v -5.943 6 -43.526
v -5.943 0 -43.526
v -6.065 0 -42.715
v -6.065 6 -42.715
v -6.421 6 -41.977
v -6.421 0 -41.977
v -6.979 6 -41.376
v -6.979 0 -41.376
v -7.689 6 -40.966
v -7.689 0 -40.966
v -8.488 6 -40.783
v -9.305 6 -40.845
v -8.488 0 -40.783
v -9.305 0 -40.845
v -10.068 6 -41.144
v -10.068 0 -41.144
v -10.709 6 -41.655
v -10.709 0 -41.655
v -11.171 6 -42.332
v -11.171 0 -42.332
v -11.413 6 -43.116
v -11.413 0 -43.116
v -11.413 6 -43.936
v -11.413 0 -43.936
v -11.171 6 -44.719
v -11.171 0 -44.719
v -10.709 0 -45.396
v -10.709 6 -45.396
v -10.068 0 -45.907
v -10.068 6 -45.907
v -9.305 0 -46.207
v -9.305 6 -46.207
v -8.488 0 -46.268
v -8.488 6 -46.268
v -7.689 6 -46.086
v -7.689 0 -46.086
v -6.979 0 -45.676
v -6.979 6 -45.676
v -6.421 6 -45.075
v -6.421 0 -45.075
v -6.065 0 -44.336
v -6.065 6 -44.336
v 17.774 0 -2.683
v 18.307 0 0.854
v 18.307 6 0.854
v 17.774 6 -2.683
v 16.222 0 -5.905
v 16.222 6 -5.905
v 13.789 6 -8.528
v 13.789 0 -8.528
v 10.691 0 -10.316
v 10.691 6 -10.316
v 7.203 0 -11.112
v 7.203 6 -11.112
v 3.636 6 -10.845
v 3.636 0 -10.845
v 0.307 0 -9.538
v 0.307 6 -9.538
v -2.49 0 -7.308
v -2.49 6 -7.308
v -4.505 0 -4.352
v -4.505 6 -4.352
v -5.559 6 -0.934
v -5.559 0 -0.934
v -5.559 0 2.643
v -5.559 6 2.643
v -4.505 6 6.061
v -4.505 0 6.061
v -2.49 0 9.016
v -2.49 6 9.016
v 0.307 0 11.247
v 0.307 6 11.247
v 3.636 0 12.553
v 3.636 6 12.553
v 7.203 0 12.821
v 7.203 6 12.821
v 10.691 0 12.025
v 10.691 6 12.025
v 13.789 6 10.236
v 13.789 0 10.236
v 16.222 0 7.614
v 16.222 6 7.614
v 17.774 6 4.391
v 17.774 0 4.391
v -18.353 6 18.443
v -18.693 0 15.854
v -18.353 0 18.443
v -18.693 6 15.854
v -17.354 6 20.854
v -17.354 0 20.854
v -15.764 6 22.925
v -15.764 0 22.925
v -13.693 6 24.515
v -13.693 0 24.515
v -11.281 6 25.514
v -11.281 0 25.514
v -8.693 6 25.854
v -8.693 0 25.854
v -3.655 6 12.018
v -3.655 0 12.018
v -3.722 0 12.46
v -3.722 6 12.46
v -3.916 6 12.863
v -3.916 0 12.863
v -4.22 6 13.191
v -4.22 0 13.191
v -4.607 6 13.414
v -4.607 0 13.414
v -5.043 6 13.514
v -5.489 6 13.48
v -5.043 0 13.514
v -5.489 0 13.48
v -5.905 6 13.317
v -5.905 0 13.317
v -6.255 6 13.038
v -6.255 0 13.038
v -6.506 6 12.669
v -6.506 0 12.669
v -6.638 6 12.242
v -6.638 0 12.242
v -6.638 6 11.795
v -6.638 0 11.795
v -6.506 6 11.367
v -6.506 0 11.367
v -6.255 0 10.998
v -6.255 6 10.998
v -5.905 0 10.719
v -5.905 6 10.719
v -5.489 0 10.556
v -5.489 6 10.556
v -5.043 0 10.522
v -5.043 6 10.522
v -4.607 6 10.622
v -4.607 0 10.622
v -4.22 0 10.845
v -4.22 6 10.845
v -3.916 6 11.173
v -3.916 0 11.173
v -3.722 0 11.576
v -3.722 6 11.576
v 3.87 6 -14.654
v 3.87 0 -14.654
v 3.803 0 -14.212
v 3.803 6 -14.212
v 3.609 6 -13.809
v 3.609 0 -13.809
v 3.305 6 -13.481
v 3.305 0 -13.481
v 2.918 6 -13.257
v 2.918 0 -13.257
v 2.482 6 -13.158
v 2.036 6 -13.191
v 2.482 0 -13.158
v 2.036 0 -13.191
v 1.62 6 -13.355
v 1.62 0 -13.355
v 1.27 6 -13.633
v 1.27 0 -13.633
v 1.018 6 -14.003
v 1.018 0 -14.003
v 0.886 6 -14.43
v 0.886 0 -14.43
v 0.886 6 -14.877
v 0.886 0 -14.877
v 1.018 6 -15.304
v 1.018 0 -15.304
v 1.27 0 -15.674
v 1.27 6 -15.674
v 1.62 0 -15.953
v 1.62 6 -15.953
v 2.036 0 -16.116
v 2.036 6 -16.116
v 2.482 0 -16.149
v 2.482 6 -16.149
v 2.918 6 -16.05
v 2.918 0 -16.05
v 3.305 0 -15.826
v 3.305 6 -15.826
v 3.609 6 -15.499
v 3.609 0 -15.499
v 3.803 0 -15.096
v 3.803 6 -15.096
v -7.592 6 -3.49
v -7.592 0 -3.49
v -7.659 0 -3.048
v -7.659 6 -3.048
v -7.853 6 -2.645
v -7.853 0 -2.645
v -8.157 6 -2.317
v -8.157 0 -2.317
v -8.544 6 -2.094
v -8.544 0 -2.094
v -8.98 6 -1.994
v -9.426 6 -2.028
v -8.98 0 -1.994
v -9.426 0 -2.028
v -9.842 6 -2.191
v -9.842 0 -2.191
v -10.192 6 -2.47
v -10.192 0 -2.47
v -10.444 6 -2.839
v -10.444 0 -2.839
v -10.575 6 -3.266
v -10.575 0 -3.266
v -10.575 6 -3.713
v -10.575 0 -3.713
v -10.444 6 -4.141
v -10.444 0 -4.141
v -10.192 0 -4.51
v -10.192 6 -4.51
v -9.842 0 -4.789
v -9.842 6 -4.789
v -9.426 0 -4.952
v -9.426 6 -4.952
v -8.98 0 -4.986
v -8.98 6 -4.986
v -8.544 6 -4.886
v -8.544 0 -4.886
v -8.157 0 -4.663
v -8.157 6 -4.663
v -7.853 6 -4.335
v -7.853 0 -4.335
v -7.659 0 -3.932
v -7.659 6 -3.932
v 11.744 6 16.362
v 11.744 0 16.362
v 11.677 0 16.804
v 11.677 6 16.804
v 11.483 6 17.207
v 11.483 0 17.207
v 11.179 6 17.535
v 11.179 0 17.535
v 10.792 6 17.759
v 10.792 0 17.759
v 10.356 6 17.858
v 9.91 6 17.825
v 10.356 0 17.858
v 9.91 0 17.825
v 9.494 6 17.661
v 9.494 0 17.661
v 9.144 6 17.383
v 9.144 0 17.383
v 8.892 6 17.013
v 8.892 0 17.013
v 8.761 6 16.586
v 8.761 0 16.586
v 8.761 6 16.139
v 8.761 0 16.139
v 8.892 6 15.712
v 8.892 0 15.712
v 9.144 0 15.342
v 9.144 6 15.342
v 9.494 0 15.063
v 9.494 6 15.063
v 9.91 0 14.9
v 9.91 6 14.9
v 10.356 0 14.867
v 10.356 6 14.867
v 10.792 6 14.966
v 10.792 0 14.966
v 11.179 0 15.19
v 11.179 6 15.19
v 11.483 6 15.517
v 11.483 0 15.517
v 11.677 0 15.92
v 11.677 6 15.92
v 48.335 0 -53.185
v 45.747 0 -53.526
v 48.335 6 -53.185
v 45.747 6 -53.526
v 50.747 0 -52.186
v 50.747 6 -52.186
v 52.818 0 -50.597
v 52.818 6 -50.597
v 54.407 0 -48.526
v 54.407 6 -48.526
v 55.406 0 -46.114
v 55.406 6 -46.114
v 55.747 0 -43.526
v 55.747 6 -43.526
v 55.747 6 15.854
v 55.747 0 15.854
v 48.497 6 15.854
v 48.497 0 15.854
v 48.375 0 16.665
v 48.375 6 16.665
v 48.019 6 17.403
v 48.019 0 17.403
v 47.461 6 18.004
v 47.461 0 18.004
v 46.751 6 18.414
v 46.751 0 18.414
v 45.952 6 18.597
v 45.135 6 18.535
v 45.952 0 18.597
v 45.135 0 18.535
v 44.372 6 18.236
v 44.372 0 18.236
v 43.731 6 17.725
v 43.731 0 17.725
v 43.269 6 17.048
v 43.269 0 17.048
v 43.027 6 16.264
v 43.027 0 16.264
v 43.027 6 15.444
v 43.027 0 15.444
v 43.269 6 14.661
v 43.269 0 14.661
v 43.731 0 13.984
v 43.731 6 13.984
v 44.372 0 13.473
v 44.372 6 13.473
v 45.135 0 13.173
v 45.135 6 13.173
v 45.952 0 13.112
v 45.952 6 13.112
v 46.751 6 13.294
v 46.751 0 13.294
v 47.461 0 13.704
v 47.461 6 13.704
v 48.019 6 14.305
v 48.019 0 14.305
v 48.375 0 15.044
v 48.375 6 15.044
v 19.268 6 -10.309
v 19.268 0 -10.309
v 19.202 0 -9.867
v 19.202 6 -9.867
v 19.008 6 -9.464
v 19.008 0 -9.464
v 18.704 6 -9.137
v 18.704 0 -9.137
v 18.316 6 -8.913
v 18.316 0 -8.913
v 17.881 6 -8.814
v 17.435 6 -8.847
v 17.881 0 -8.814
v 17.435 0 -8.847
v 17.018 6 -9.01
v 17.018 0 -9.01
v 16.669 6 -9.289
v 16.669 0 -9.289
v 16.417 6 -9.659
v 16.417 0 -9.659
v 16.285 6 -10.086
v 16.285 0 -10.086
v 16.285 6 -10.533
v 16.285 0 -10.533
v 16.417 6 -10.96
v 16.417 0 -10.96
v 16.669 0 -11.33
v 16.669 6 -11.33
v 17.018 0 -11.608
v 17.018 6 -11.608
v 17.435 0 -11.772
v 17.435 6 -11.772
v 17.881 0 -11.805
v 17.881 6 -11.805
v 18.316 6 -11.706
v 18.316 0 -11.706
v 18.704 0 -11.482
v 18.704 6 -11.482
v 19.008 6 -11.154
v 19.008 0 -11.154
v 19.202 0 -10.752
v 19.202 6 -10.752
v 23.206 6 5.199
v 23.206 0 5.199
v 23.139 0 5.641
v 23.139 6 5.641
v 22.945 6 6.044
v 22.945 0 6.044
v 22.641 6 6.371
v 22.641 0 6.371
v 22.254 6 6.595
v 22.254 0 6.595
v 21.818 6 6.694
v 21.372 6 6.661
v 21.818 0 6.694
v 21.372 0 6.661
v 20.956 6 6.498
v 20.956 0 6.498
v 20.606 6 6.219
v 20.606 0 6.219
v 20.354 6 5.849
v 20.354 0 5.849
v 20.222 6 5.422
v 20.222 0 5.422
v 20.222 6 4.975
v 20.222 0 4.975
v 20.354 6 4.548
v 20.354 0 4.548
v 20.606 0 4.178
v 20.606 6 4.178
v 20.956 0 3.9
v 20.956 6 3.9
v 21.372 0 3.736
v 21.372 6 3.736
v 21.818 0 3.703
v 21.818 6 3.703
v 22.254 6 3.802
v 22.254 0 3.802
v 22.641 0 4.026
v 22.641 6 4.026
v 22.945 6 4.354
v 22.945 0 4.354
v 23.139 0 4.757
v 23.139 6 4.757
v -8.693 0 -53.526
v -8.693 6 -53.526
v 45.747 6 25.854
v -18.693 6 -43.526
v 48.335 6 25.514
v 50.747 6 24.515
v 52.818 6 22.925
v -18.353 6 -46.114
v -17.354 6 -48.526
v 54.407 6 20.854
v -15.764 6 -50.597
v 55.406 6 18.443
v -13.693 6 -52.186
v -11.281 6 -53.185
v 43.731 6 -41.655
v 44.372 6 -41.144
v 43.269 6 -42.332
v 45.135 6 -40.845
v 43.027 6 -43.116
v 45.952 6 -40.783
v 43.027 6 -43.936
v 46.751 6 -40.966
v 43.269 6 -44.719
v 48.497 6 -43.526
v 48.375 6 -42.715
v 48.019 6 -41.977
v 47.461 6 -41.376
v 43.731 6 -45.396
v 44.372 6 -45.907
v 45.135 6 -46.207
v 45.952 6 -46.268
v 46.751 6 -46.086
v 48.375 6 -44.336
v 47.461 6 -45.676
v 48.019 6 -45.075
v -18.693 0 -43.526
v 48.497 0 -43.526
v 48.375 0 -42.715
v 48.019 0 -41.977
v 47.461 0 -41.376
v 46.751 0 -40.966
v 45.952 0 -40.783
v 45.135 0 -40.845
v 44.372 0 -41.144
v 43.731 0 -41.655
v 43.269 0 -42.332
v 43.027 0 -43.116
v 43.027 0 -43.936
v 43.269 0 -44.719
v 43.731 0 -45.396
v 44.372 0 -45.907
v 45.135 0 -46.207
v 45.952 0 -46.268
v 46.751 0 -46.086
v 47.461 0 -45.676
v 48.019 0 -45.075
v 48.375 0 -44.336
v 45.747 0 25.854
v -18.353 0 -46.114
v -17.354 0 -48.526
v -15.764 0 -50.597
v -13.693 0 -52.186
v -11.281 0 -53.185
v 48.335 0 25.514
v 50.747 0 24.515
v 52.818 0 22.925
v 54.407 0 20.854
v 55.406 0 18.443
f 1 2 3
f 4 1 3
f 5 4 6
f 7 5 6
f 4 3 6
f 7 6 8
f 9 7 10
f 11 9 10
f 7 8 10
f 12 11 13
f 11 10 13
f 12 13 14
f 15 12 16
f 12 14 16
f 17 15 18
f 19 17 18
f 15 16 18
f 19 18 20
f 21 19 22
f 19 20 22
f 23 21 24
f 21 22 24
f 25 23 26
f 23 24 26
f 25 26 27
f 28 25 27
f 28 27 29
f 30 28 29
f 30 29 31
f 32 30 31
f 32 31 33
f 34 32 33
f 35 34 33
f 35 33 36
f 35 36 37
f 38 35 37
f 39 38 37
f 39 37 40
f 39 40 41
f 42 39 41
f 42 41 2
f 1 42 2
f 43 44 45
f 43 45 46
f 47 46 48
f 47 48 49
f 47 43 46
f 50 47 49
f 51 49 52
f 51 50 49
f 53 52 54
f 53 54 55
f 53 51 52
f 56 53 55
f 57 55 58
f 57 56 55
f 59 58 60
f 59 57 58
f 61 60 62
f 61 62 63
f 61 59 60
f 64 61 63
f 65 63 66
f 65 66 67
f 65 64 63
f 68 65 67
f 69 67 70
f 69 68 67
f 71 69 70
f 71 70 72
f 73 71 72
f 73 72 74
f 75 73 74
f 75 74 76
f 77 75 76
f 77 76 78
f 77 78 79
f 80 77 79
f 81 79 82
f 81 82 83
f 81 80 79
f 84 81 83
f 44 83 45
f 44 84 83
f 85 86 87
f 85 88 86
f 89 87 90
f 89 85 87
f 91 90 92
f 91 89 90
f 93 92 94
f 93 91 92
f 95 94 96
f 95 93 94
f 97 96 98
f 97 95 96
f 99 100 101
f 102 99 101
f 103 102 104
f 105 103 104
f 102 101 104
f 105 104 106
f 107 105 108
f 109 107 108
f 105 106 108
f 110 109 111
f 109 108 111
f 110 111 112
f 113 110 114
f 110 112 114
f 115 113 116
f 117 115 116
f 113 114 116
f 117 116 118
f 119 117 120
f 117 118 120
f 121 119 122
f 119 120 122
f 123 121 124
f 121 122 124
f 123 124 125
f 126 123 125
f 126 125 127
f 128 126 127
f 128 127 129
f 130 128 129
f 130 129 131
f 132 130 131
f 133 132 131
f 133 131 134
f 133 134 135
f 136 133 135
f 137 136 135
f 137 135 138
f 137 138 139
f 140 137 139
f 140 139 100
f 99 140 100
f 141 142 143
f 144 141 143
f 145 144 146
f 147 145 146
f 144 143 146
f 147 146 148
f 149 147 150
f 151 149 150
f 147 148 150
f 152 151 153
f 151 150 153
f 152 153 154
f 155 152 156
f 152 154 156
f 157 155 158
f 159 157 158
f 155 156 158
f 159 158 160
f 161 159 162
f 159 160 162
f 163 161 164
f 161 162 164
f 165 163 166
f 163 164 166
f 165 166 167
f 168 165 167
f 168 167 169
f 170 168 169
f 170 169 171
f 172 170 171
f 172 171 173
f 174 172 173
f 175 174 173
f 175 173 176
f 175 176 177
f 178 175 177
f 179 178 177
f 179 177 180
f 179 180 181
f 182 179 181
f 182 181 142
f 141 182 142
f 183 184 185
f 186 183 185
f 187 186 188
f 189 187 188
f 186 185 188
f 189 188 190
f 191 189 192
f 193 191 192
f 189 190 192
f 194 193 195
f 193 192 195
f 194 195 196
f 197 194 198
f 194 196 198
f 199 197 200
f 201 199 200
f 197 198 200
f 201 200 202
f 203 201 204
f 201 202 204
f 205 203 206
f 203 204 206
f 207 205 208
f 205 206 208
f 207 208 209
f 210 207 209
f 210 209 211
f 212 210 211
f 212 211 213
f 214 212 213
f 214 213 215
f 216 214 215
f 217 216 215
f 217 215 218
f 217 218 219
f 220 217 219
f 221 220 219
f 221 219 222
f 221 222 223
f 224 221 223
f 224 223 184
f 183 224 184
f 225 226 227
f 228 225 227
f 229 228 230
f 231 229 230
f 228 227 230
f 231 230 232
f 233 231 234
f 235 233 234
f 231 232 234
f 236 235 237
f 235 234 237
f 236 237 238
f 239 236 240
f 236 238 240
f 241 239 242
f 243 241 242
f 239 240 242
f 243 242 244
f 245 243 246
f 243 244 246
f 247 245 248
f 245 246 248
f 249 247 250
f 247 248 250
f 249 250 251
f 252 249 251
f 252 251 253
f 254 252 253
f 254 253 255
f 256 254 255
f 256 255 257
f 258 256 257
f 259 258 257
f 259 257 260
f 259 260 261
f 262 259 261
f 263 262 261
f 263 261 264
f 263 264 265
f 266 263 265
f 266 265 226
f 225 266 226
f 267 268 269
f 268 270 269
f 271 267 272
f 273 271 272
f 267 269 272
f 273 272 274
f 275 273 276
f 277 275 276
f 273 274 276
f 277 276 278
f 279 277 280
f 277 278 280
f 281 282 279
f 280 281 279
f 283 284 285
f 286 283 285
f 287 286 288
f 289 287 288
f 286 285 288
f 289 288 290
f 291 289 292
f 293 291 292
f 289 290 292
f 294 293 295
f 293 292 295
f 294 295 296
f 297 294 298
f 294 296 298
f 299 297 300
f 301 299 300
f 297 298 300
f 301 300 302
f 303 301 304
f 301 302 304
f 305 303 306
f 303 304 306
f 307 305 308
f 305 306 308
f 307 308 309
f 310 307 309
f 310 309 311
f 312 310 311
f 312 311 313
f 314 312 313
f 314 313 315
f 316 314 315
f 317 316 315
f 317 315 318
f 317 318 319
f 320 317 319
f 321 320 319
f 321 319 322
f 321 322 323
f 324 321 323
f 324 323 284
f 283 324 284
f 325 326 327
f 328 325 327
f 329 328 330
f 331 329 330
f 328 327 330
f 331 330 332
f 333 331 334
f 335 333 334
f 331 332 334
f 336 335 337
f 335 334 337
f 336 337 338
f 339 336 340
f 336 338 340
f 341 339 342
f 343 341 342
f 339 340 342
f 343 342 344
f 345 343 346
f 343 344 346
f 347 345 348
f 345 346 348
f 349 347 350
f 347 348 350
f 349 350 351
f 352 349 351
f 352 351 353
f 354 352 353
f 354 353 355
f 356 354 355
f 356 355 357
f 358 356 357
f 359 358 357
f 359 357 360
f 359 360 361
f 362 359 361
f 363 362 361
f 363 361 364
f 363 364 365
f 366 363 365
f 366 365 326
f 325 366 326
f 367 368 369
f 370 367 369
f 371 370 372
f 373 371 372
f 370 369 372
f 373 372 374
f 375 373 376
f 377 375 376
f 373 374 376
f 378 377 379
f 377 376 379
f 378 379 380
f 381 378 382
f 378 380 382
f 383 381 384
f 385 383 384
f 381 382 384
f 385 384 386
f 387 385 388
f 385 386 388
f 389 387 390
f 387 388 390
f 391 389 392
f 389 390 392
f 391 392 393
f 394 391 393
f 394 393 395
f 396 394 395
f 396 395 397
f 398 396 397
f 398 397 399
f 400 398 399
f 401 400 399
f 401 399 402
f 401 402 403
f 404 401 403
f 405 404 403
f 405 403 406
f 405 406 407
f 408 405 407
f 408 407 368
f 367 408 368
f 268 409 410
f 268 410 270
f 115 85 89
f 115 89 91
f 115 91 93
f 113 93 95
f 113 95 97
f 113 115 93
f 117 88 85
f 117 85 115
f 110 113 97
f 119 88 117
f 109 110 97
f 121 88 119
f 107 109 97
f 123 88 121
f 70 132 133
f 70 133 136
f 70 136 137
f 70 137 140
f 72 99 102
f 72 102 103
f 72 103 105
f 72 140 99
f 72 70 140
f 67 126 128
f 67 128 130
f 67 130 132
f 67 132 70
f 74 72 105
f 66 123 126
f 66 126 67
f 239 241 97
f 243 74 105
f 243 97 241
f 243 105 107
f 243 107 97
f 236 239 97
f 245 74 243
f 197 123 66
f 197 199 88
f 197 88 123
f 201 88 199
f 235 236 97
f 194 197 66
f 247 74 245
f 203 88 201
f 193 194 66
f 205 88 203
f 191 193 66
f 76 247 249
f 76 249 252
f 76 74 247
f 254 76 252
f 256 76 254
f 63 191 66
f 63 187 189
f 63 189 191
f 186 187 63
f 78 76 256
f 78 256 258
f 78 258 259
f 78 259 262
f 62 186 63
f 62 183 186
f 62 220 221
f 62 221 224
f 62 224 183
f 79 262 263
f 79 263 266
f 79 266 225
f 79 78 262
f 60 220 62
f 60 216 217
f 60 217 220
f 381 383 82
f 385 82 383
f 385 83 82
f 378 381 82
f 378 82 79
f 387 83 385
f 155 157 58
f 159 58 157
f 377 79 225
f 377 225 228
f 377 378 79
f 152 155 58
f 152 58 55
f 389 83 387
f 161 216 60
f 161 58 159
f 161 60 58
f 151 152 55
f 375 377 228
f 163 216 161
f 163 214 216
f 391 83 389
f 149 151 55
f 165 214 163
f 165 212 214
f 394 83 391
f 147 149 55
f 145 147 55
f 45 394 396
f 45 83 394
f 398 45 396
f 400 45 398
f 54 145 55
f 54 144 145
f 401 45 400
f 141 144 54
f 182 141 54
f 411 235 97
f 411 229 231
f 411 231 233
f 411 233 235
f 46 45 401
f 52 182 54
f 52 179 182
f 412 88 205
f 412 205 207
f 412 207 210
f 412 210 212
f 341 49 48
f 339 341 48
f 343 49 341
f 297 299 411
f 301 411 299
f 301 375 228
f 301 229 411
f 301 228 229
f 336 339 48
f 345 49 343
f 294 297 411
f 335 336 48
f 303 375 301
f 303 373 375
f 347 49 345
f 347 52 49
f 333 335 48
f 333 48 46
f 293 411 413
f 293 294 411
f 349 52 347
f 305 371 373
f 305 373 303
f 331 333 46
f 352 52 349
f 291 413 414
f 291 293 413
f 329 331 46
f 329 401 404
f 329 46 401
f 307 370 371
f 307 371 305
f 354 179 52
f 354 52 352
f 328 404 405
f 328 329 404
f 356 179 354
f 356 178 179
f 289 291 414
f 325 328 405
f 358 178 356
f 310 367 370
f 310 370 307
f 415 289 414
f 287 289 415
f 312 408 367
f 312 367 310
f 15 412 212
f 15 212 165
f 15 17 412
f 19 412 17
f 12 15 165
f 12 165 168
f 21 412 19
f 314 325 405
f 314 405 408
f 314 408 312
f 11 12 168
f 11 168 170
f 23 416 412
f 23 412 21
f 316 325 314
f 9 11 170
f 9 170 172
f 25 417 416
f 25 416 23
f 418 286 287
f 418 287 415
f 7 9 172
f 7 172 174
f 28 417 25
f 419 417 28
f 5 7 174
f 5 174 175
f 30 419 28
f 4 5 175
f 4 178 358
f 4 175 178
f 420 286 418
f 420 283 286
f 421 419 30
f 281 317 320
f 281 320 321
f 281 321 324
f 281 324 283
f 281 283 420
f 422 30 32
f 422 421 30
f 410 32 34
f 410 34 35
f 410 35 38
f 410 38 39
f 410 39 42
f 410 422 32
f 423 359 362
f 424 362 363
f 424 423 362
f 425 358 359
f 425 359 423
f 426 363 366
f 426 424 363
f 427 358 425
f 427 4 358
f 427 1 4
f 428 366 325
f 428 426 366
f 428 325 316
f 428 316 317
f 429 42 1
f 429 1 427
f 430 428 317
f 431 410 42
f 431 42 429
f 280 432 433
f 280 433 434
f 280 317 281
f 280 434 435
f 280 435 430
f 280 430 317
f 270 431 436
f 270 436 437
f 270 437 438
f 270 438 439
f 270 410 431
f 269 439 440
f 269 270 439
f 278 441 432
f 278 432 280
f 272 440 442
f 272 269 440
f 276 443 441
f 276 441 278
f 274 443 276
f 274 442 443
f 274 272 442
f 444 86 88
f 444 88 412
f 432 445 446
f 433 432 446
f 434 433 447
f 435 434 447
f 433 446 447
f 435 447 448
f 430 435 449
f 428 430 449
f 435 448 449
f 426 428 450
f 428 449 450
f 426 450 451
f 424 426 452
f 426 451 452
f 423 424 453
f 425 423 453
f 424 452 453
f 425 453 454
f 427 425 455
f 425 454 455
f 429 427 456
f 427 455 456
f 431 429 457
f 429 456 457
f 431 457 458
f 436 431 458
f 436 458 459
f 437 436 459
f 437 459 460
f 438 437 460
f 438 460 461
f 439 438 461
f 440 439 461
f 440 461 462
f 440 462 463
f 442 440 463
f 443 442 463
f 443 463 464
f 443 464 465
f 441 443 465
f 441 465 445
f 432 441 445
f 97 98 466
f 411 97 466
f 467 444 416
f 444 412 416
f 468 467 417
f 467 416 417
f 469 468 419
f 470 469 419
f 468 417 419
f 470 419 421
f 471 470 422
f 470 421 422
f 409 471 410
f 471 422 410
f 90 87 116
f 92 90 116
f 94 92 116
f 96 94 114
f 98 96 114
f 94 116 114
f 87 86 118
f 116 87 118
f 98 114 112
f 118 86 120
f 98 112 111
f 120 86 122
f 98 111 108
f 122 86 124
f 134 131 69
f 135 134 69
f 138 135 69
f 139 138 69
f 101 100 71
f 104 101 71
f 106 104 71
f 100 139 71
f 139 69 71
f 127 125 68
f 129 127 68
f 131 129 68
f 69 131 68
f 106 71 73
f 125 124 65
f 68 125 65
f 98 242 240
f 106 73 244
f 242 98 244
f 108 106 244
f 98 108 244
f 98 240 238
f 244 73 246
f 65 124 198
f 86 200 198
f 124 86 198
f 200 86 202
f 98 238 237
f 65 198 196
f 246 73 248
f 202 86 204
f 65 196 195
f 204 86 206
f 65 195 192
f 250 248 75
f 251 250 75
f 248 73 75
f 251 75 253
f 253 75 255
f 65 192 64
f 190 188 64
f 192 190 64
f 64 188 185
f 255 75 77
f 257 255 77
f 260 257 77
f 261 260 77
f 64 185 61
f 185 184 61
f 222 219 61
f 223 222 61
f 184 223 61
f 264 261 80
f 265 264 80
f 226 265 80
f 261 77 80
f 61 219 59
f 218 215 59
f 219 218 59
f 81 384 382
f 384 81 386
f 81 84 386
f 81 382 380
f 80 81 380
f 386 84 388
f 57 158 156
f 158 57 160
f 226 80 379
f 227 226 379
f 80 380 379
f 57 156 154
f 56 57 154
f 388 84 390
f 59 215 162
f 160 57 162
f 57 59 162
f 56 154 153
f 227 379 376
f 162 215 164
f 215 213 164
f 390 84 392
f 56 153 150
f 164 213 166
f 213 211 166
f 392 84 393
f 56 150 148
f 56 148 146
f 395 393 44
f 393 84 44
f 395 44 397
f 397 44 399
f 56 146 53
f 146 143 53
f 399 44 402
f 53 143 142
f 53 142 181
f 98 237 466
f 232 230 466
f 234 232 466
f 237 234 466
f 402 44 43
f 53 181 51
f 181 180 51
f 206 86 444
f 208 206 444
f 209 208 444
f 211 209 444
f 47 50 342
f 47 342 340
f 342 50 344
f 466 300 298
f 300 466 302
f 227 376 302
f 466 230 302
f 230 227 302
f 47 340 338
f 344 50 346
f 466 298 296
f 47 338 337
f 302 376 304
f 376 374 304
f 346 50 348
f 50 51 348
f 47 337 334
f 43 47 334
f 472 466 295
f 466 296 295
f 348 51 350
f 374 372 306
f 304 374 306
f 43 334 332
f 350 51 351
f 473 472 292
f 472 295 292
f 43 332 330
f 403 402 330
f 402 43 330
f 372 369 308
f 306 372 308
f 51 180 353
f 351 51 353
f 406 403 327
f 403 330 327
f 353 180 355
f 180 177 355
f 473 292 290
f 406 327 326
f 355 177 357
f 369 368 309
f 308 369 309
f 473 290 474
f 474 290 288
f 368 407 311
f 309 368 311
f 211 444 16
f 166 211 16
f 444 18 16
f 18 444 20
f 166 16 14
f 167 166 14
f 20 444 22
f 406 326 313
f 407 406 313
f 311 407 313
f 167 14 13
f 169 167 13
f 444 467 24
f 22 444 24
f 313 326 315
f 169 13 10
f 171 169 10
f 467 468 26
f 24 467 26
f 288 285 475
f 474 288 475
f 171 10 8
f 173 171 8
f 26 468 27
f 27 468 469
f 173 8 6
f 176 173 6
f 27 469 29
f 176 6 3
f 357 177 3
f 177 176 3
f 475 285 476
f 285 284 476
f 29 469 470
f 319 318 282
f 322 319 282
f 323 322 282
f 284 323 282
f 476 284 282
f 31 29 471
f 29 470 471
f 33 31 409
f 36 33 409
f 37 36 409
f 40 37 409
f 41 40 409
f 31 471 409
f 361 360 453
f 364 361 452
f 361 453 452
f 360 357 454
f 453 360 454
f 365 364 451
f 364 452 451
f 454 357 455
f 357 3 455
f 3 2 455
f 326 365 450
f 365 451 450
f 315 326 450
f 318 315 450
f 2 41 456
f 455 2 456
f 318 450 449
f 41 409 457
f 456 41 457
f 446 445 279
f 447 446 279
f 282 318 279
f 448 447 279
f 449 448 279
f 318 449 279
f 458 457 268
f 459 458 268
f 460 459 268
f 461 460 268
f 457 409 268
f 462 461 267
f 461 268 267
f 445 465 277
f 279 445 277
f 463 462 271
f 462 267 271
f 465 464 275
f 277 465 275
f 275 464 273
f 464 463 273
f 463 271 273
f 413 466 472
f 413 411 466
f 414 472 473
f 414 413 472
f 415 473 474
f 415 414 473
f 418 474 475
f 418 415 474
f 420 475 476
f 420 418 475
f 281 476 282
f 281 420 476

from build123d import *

# Parameters (mm, degrees)
SKETCH2_W           = 74.44
SKETCH2_H           = 79.38
SKETCH2_R           = 12
BOSS_EXTRUDE1_DEPTH = 6
SKETCH6_R           = 2.75
CUT_EXTRUDE2_DEPTH  = 10
SKETCH8_R           = 1.5
CUT_EXTRUDE4_DEPTH  = 7
FILLET1_R           = 10


with BuildPart() as part:
    # Sketch2 → Boss-Extrude1 (new body)
    with BuildSketch(Plane(origin=(0, 0, 0), x_dir=(1, 0, 0), z_dir=(0, 1, 0))):
        with Locations((18.526729133, 13.835644594)):
            Rectangle(SKETCH2_W, SKETCH2_H)
        with Locations((6.306729133, -0.854355406)):
            Circle(SKETCH2_R, mode=Mode.SUBTRACT)
    extrude(amount=BOSS_EXTRUDE1_DEPTH)

    # Sketch6 → Cut-Extrude2 (cut)
    with BuildSketch(Plane.XZ):
        with Locations((45.746729133, 15.854355406)):
            Circle(SKETCH6_R)
        with Locations((45.746729133, -43.525644594)):
            Circle(SKETCH6_R)
        with Locations((-8.693270867, -43.525644594)):
            Circle(SKETCH6_R)
    extrude(amount=-CUT_EXTRUDE2_DEPTH, mode=Mode.SUBTRACT)

    # Sketch8 → Cut-Extrude4 (cut, through all)
    with BuildSketch(Plane.XZ):
        with Locations((21.705664704, 5.198637084)):
            Circle(SKETCH8_R)
        with Locations((17.768455213, -10.30937315)):
            Circle(SKETCH8_R)
        with Locations((2.369519643, -14.653654828)):
            Circle(SKETCH8_R)
        with Locations((-9.092206437, -3.489926272)):
            Circle(SKETCH8_R)
        with Locations((-5.154996946, 12.018083962)):
            Circle(SKETCH8_R)
        with Locations((10.243938624, 16.36236564)):
            Circle(SKETCH8_R)
    extrude(amount=-CUT_EXTRUDE4_DEPTH, mode=Mode.SUBTRACT)

    # Fillet1
    fillet1_edges = [part.edges().sort_by_distance(p)[0] for p in [
        (-18.693270867, 3, -53.525644594),
        (55.746729133, 3, -53.525644594),
        (55.746729133, 3, 25.854355406),
        (-18.693270867, 3, 25.854355406),
    ]]
    fillet(fillet1_edges, radius=FILLET1_R)


solid = part.part
